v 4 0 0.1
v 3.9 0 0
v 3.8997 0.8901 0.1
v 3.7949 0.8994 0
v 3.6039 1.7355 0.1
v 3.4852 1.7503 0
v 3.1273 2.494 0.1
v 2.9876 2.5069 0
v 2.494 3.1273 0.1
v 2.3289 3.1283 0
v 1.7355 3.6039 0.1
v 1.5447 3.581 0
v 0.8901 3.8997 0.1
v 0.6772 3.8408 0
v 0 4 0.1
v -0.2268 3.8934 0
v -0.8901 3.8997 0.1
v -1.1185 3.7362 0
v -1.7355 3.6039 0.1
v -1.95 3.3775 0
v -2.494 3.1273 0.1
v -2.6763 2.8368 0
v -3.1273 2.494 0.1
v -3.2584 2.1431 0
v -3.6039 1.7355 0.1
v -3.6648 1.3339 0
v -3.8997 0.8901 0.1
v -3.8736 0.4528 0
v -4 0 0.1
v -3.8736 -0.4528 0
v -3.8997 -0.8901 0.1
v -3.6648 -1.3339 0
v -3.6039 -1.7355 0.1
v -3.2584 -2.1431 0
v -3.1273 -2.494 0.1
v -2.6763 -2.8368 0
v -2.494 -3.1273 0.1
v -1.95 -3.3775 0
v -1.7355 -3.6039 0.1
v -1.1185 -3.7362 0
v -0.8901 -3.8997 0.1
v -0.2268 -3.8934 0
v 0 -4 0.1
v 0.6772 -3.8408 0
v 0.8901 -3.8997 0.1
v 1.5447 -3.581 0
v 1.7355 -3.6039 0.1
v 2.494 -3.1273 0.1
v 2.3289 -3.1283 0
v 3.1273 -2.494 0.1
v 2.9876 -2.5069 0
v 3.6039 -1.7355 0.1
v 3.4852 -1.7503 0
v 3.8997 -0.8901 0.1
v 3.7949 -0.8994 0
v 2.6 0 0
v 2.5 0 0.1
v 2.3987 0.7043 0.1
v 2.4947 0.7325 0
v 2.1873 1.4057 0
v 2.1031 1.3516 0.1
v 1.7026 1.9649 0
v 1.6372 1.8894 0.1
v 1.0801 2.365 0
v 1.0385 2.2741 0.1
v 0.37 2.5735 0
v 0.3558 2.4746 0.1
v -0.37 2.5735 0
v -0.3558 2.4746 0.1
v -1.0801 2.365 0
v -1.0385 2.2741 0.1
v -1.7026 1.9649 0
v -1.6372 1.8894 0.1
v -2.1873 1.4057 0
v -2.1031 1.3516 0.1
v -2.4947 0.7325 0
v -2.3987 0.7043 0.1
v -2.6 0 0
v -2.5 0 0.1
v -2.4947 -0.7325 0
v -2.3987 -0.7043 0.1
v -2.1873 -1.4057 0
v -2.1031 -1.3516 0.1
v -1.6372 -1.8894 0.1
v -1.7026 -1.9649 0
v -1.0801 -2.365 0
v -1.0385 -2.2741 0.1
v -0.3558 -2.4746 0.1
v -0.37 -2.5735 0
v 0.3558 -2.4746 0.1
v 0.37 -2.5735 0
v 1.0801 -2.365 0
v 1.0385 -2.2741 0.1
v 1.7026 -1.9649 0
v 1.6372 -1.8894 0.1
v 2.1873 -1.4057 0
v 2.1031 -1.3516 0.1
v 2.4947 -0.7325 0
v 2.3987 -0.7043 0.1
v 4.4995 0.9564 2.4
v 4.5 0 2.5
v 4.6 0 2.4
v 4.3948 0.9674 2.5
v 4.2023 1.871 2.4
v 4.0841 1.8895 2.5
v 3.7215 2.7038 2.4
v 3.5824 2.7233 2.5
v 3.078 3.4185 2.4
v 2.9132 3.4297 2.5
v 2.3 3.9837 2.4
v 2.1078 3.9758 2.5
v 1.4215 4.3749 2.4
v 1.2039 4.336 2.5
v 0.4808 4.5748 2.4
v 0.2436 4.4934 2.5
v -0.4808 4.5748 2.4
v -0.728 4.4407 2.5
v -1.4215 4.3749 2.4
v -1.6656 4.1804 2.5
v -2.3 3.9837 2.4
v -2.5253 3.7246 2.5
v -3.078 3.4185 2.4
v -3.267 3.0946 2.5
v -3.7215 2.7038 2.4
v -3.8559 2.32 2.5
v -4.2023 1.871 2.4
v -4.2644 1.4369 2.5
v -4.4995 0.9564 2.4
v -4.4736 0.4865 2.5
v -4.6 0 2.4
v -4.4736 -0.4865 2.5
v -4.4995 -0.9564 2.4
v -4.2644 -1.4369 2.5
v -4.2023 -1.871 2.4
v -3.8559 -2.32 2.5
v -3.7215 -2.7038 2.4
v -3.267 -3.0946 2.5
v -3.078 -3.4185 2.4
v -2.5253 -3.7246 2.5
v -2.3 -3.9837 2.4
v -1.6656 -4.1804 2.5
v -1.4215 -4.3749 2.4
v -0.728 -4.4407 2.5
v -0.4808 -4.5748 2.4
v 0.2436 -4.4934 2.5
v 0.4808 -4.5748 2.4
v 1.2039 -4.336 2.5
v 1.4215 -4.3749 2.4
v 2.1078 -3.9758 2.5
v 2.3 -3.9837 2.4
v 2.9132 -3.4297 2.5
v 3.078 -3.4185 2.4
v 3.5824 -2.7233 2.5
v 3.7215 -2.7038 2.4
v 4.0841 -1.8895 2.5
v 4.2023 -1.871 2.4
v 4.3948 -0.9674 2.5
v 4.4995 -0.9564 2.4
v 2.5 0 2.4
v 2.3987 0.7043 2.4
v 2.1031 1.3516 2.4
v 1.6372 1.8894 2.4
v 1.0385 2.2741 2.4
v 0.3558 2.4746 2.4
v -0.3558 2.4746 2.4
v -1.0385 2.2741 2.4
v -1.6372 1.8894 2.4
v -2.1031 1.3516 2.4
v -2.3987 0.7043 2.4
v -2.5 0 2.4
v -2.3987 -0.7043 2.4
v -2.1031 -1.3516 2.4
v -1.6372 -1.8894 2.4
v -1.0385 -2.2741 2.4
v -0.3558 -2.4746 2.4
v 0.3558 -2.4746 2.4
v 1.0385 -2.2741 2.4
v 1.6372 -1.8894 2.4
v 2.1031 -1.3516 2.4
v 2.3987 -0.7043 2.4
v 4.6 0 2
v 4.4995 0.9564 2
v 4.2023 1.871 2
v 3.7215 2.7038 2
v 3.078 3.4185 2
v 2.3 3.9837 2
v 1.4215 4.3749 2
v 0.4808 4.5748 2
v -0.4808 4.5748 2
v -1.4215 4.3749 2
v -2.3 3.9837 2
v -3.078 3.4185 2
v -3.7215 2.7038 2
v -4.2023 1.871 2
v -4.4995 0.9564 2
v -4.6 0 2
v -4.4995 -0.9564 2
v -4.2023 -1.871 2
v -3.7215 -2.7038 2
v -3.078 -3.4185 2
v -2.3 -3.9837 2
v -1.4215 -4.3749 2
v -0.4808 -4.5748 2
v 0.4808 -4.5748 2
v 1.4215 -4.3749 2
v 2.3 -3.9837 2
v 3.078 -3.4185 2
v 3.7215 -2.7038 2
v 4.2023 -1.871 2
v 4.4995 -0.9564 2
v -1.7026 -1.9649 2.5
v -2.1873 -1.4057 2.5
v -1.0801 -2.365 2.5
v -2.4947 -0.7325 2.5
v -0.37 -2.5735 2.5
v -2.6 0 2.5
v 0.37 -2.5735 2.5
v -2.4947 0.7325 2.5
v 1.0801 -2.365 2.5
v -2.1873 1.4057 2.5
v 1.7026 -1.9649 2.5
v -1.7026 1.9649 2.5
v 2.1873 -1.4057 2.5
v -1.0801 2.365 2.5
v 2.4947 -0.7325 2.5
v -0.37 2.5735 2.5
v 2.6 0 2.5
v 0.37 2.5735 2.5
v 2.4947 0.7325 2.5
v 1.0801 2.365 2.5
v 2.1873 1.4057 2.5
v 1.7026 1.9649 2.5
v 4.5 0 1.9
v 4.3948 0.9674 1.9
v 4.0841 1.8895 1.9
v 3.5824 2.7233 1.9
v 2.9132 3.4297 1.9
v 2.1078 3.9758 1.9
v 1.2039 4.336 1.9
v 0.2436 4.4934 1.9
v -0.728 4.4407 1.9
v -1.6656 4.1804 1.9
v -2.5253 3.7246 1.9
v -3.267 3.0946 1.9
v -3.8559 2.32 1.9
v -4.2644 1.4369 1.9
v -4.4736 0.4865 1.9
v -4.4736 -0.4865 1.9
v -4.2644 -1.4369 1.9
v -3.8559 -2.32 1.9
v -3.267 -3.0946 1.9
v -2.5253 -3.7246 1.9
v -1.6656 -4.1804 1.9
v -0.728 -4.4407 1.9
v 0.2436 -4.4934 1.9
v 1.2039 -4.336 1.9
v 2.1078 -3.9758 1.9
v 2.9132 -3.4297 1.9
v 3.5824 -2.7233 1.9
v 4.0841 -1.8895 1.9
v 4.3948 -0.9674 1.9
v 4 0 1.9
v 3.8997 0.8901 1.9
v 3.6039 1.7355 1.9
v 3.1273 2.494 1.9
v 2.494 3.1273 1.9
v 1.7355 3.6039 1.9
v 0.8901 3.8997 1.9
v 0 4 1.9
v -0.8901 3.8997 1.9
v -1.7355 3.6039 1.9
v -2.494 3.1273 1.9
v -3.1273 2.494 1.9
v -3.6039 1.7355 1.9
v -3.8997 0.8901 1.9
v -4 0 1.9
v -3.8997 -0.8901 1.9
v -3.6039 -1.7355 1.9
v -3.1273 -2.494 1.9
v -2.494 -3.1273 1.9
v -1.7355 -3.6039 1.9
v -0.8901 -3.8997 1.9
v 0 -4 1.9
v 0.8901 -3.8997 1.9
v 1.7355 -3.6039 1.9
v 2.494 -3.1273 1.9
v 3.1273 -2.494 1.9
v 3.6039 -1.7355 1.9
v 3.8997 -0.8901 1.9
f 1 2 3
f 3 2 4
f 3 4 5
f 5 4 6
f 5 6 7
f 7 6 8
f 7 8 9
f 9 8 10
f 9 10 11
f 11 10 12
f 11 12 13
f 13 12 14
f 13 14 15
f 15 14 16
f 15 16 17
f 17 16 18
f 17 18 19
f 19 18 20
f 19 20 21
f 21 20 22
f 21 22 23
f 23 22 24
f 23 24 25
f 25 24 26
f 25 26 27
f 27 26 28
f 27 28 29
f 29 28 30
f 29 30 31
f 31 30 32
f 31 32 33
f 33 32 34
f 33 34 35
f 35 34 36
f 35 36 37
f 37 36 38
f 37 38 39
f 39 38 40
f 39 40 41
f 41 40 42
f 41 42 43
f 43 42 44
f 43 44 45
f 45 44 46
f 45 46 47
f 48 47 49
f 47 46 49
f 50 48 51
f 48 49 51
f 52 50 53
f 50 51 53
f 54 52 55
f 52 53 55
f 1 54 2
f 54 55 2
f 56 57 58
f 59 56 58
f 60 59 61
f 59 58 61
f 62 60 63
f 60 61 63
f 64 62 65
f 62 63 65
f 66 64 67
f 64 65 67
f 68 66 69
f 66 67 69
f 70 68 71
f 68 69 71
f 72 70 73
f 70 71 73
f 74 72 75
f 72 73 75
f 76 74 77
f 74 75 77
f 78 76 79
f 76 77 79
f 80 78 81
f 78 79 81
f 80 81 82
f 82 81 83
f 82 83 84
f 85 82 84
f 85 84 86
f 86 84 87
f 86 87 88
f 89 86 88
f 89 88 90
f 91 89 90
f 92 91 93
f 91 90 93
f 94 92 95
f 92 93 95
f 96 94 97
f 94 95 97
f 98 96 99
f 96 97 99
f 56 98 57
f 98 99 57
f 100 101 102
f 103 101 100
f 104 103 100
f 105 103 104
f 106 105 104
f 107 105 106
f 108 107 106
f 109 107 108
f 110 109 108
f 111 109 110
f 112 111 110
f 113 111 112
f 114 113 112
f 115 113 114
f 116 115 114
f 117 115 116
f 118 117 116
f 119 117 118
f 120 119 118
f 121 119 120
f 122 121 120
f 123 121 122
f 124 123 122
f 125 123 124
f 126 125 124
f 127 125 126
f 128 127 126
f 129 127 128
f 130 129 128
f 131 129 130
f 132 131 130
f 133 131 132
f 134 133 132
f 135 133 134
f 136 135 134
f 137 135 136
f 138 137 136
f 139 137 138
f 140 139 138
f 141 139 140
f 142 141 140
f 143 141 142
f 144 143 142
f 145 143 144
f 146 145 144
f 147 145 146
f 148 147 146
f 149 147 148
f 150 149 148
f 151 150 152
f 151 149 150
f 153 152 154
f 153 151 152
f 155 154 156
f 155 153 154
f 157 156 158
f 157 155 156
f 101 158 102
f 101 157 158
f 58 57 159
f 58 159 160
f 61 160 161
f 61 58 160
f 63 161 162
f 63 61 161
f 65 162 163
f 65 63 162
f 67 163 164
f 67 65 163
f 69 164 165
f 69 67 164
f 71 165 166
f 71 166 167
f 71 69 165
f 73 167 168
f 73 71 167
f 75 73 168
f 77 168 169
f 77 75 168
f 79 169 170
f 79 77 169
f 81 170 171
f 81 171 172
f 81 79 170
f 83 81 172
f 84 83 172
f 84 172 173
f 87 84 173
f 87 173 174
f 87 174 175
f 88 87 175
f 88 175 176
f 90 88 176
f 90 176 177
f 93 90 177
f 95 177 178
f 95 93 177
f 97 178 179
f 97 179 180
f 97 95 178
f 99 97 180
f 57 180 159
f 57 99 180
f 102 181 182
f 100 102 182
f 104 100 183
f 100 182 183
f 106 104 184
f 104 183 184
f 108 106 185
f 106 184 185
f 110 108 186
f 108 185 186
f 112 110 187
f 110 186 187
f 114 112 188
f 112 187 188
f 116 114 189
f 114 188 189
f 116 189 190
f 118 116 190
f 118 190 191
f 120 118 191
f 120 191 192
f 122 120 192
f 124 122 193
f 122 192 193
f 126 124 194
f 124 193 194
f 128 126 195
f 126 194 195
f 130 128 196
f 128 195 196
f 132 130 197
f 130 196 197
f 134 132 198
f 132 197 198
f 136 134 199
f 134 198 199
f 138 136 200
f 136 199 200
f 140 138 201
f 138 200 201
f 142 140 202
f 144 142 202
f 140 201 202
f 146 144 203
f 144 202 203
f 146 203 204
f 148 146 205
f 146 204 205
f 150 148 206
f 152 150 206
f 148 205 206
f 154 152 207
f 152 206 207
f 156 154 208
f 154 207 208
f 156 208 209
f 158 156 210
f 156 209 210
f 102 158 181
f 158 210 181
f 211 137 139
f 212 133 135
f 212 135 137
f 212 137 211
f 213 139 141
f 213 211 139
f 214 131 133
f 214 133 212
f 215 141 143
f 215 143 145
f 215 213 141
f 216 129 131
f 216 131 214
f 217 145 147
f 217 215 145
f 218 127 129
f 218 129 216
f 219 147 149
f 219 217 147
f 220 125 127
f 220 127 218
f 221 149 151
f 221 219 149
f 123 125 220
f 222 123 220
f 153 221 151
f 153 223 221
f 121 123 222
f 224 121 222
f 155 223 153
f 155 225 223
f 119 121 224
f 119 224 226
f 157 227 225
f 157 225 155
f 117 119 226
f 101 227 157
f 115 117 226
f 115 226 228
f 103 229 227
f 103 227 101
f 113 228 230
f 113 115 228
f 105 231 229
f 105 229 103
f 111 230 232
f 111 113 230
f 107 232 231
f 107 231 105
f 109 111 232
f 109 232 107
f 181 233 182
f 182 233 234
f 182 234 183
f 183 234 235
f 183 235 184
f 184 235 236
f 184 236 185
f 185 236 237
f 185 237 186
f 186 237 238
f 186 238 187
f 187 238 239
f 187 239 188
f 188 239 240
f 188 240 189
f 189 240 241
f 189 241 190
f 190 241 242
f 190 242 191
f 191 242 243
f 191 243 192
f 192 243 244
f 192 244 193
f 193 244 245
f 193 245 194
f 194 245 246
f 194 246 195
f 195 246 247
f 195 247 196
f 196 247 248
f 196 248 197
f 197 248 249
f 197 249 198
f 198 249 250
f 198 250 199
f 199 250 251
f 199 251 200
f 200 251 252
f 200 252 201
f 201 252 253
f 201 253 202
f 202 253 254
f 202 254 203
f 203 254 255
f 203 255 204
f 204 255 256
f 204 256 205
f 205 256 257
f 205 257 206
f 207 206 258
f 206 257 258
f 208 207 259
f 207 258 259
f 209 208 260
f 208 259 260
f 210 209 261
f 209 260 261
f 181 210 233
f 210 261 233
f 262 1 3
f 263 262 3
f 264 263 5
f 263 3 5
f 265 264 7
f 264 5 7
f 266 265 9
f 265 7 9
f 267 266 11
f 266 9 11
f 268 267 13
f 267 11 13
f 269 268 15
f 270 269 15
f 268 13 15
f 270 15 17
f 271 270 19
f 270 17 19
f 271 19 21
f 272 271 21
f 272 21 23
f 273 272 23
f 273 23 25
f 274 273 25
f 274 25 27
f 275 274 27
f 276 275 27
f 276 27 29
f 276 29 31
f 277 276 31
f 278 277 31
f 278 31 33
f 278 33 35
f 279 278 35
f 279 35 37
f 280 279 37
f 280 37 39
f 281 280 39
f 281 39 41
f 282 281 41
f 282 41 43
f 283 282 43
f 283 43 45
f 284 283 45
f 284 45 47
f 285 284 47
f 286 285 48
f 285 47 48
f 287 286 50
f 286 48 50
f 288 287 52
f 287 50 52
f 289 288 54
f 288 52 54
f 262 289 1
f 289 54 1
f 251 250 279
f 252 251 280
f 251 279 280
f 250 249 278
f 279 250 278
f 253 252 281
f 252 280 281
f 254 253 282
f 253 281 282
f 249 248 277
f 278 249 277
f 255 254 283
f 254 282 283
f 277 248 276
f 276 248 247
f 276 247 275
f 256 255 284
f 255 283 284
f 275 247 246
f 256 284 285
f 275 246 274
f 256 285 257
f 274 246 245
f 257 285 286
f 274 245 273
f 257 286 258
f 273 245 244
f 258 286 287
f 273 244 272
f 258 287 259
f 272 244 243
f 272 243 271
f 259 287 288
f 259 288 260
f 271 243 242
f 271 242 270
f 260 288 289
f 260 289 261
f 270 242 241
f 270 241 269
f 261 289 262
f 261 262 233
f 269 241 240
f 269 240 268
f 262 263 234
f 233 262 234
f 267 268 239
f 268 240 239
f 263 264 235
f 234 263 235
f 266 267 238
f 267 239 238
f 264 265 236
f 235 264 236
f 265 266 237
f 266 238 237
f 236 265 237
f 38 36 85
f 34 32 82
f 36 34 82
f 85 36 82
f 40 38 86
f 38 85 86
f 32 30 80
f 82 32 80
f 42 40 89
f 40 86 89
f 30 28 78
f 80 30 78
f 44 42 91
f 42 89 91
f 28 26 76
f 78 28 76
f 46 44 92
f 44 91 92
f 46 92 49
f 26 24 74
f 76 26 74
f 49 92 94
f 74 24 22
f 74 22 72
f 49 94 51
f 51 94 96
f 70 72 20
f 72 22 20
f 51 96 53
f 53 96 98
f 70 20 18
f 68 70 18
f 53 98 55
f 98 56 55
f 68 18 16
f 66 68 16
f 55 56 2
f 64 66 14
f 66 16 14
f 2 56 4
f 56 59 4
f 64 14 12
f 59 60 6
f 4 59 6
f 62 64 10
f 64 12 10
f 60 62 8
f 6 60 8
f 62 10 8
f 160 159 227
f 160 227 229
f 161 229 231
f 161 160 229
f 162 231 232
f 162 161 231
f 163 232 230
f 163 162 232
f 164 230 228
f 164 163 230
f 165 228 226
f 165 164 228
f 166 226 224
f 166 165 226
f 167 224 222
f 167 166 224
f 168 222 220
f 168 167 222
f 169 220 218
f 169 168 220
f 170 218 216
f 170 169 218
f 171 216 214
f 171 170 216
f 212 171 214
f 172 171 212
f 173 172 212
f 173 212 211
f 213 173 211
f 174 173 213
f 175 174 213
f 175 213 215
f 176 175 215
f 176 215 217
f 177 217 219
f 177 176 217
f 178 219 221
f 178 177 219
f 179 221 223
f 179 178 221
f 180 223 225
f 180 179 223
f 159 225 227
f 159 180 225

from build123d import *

# Parameters (mm, degrees)
BEARINGSKE_R   = 4
BEARINGSKE_R_2 = 2.5
BEARING_DEPTH  = 2.5
FLANGE_START   = -0.6
FLANGESKE_R    = 4.6
FLANGESKE_R_2  = 4
FLANGE_DEPTH   = 0.6
CHAMFER_2_SIZE = 0.1


with BuildPart() as part:
    # BearingSke → Bearing (new body)
    with BuildSketch(Plane.XY):
        Circle(BEARINGSKE_R)
        Circle(BEARINGSKE_R_2, mode=Mode.SUBTRACT)
    extrude(amount=BEARING_DEPTH)

    # FlangeSke → Flange (add)
    with BuildSketch(Plane.XY.offset(2.5).offset(FLANGE_START)):
        Circle(FLANGESKE_R)
        Circle(FLANGESKE_R_2, mode=Mode.SUBTRACT)
    extrude(amount=FLANGE_DEPTH)

    # Chamfer 2
    chamfer_2_edges = [part.edges().sort_by_distance(p)[0] for p in [
        (-4.6, 0, 1.9),
        (-4.6, 0, 2.5),
        (-4, 0, 0),
        (-2.5, 0, 0),
        (-2.5, 0, 2.5),
    ]]
    chamfer(chamfer_2_edges, length=CHAMFER_2_SIZE)


solid = part.part
